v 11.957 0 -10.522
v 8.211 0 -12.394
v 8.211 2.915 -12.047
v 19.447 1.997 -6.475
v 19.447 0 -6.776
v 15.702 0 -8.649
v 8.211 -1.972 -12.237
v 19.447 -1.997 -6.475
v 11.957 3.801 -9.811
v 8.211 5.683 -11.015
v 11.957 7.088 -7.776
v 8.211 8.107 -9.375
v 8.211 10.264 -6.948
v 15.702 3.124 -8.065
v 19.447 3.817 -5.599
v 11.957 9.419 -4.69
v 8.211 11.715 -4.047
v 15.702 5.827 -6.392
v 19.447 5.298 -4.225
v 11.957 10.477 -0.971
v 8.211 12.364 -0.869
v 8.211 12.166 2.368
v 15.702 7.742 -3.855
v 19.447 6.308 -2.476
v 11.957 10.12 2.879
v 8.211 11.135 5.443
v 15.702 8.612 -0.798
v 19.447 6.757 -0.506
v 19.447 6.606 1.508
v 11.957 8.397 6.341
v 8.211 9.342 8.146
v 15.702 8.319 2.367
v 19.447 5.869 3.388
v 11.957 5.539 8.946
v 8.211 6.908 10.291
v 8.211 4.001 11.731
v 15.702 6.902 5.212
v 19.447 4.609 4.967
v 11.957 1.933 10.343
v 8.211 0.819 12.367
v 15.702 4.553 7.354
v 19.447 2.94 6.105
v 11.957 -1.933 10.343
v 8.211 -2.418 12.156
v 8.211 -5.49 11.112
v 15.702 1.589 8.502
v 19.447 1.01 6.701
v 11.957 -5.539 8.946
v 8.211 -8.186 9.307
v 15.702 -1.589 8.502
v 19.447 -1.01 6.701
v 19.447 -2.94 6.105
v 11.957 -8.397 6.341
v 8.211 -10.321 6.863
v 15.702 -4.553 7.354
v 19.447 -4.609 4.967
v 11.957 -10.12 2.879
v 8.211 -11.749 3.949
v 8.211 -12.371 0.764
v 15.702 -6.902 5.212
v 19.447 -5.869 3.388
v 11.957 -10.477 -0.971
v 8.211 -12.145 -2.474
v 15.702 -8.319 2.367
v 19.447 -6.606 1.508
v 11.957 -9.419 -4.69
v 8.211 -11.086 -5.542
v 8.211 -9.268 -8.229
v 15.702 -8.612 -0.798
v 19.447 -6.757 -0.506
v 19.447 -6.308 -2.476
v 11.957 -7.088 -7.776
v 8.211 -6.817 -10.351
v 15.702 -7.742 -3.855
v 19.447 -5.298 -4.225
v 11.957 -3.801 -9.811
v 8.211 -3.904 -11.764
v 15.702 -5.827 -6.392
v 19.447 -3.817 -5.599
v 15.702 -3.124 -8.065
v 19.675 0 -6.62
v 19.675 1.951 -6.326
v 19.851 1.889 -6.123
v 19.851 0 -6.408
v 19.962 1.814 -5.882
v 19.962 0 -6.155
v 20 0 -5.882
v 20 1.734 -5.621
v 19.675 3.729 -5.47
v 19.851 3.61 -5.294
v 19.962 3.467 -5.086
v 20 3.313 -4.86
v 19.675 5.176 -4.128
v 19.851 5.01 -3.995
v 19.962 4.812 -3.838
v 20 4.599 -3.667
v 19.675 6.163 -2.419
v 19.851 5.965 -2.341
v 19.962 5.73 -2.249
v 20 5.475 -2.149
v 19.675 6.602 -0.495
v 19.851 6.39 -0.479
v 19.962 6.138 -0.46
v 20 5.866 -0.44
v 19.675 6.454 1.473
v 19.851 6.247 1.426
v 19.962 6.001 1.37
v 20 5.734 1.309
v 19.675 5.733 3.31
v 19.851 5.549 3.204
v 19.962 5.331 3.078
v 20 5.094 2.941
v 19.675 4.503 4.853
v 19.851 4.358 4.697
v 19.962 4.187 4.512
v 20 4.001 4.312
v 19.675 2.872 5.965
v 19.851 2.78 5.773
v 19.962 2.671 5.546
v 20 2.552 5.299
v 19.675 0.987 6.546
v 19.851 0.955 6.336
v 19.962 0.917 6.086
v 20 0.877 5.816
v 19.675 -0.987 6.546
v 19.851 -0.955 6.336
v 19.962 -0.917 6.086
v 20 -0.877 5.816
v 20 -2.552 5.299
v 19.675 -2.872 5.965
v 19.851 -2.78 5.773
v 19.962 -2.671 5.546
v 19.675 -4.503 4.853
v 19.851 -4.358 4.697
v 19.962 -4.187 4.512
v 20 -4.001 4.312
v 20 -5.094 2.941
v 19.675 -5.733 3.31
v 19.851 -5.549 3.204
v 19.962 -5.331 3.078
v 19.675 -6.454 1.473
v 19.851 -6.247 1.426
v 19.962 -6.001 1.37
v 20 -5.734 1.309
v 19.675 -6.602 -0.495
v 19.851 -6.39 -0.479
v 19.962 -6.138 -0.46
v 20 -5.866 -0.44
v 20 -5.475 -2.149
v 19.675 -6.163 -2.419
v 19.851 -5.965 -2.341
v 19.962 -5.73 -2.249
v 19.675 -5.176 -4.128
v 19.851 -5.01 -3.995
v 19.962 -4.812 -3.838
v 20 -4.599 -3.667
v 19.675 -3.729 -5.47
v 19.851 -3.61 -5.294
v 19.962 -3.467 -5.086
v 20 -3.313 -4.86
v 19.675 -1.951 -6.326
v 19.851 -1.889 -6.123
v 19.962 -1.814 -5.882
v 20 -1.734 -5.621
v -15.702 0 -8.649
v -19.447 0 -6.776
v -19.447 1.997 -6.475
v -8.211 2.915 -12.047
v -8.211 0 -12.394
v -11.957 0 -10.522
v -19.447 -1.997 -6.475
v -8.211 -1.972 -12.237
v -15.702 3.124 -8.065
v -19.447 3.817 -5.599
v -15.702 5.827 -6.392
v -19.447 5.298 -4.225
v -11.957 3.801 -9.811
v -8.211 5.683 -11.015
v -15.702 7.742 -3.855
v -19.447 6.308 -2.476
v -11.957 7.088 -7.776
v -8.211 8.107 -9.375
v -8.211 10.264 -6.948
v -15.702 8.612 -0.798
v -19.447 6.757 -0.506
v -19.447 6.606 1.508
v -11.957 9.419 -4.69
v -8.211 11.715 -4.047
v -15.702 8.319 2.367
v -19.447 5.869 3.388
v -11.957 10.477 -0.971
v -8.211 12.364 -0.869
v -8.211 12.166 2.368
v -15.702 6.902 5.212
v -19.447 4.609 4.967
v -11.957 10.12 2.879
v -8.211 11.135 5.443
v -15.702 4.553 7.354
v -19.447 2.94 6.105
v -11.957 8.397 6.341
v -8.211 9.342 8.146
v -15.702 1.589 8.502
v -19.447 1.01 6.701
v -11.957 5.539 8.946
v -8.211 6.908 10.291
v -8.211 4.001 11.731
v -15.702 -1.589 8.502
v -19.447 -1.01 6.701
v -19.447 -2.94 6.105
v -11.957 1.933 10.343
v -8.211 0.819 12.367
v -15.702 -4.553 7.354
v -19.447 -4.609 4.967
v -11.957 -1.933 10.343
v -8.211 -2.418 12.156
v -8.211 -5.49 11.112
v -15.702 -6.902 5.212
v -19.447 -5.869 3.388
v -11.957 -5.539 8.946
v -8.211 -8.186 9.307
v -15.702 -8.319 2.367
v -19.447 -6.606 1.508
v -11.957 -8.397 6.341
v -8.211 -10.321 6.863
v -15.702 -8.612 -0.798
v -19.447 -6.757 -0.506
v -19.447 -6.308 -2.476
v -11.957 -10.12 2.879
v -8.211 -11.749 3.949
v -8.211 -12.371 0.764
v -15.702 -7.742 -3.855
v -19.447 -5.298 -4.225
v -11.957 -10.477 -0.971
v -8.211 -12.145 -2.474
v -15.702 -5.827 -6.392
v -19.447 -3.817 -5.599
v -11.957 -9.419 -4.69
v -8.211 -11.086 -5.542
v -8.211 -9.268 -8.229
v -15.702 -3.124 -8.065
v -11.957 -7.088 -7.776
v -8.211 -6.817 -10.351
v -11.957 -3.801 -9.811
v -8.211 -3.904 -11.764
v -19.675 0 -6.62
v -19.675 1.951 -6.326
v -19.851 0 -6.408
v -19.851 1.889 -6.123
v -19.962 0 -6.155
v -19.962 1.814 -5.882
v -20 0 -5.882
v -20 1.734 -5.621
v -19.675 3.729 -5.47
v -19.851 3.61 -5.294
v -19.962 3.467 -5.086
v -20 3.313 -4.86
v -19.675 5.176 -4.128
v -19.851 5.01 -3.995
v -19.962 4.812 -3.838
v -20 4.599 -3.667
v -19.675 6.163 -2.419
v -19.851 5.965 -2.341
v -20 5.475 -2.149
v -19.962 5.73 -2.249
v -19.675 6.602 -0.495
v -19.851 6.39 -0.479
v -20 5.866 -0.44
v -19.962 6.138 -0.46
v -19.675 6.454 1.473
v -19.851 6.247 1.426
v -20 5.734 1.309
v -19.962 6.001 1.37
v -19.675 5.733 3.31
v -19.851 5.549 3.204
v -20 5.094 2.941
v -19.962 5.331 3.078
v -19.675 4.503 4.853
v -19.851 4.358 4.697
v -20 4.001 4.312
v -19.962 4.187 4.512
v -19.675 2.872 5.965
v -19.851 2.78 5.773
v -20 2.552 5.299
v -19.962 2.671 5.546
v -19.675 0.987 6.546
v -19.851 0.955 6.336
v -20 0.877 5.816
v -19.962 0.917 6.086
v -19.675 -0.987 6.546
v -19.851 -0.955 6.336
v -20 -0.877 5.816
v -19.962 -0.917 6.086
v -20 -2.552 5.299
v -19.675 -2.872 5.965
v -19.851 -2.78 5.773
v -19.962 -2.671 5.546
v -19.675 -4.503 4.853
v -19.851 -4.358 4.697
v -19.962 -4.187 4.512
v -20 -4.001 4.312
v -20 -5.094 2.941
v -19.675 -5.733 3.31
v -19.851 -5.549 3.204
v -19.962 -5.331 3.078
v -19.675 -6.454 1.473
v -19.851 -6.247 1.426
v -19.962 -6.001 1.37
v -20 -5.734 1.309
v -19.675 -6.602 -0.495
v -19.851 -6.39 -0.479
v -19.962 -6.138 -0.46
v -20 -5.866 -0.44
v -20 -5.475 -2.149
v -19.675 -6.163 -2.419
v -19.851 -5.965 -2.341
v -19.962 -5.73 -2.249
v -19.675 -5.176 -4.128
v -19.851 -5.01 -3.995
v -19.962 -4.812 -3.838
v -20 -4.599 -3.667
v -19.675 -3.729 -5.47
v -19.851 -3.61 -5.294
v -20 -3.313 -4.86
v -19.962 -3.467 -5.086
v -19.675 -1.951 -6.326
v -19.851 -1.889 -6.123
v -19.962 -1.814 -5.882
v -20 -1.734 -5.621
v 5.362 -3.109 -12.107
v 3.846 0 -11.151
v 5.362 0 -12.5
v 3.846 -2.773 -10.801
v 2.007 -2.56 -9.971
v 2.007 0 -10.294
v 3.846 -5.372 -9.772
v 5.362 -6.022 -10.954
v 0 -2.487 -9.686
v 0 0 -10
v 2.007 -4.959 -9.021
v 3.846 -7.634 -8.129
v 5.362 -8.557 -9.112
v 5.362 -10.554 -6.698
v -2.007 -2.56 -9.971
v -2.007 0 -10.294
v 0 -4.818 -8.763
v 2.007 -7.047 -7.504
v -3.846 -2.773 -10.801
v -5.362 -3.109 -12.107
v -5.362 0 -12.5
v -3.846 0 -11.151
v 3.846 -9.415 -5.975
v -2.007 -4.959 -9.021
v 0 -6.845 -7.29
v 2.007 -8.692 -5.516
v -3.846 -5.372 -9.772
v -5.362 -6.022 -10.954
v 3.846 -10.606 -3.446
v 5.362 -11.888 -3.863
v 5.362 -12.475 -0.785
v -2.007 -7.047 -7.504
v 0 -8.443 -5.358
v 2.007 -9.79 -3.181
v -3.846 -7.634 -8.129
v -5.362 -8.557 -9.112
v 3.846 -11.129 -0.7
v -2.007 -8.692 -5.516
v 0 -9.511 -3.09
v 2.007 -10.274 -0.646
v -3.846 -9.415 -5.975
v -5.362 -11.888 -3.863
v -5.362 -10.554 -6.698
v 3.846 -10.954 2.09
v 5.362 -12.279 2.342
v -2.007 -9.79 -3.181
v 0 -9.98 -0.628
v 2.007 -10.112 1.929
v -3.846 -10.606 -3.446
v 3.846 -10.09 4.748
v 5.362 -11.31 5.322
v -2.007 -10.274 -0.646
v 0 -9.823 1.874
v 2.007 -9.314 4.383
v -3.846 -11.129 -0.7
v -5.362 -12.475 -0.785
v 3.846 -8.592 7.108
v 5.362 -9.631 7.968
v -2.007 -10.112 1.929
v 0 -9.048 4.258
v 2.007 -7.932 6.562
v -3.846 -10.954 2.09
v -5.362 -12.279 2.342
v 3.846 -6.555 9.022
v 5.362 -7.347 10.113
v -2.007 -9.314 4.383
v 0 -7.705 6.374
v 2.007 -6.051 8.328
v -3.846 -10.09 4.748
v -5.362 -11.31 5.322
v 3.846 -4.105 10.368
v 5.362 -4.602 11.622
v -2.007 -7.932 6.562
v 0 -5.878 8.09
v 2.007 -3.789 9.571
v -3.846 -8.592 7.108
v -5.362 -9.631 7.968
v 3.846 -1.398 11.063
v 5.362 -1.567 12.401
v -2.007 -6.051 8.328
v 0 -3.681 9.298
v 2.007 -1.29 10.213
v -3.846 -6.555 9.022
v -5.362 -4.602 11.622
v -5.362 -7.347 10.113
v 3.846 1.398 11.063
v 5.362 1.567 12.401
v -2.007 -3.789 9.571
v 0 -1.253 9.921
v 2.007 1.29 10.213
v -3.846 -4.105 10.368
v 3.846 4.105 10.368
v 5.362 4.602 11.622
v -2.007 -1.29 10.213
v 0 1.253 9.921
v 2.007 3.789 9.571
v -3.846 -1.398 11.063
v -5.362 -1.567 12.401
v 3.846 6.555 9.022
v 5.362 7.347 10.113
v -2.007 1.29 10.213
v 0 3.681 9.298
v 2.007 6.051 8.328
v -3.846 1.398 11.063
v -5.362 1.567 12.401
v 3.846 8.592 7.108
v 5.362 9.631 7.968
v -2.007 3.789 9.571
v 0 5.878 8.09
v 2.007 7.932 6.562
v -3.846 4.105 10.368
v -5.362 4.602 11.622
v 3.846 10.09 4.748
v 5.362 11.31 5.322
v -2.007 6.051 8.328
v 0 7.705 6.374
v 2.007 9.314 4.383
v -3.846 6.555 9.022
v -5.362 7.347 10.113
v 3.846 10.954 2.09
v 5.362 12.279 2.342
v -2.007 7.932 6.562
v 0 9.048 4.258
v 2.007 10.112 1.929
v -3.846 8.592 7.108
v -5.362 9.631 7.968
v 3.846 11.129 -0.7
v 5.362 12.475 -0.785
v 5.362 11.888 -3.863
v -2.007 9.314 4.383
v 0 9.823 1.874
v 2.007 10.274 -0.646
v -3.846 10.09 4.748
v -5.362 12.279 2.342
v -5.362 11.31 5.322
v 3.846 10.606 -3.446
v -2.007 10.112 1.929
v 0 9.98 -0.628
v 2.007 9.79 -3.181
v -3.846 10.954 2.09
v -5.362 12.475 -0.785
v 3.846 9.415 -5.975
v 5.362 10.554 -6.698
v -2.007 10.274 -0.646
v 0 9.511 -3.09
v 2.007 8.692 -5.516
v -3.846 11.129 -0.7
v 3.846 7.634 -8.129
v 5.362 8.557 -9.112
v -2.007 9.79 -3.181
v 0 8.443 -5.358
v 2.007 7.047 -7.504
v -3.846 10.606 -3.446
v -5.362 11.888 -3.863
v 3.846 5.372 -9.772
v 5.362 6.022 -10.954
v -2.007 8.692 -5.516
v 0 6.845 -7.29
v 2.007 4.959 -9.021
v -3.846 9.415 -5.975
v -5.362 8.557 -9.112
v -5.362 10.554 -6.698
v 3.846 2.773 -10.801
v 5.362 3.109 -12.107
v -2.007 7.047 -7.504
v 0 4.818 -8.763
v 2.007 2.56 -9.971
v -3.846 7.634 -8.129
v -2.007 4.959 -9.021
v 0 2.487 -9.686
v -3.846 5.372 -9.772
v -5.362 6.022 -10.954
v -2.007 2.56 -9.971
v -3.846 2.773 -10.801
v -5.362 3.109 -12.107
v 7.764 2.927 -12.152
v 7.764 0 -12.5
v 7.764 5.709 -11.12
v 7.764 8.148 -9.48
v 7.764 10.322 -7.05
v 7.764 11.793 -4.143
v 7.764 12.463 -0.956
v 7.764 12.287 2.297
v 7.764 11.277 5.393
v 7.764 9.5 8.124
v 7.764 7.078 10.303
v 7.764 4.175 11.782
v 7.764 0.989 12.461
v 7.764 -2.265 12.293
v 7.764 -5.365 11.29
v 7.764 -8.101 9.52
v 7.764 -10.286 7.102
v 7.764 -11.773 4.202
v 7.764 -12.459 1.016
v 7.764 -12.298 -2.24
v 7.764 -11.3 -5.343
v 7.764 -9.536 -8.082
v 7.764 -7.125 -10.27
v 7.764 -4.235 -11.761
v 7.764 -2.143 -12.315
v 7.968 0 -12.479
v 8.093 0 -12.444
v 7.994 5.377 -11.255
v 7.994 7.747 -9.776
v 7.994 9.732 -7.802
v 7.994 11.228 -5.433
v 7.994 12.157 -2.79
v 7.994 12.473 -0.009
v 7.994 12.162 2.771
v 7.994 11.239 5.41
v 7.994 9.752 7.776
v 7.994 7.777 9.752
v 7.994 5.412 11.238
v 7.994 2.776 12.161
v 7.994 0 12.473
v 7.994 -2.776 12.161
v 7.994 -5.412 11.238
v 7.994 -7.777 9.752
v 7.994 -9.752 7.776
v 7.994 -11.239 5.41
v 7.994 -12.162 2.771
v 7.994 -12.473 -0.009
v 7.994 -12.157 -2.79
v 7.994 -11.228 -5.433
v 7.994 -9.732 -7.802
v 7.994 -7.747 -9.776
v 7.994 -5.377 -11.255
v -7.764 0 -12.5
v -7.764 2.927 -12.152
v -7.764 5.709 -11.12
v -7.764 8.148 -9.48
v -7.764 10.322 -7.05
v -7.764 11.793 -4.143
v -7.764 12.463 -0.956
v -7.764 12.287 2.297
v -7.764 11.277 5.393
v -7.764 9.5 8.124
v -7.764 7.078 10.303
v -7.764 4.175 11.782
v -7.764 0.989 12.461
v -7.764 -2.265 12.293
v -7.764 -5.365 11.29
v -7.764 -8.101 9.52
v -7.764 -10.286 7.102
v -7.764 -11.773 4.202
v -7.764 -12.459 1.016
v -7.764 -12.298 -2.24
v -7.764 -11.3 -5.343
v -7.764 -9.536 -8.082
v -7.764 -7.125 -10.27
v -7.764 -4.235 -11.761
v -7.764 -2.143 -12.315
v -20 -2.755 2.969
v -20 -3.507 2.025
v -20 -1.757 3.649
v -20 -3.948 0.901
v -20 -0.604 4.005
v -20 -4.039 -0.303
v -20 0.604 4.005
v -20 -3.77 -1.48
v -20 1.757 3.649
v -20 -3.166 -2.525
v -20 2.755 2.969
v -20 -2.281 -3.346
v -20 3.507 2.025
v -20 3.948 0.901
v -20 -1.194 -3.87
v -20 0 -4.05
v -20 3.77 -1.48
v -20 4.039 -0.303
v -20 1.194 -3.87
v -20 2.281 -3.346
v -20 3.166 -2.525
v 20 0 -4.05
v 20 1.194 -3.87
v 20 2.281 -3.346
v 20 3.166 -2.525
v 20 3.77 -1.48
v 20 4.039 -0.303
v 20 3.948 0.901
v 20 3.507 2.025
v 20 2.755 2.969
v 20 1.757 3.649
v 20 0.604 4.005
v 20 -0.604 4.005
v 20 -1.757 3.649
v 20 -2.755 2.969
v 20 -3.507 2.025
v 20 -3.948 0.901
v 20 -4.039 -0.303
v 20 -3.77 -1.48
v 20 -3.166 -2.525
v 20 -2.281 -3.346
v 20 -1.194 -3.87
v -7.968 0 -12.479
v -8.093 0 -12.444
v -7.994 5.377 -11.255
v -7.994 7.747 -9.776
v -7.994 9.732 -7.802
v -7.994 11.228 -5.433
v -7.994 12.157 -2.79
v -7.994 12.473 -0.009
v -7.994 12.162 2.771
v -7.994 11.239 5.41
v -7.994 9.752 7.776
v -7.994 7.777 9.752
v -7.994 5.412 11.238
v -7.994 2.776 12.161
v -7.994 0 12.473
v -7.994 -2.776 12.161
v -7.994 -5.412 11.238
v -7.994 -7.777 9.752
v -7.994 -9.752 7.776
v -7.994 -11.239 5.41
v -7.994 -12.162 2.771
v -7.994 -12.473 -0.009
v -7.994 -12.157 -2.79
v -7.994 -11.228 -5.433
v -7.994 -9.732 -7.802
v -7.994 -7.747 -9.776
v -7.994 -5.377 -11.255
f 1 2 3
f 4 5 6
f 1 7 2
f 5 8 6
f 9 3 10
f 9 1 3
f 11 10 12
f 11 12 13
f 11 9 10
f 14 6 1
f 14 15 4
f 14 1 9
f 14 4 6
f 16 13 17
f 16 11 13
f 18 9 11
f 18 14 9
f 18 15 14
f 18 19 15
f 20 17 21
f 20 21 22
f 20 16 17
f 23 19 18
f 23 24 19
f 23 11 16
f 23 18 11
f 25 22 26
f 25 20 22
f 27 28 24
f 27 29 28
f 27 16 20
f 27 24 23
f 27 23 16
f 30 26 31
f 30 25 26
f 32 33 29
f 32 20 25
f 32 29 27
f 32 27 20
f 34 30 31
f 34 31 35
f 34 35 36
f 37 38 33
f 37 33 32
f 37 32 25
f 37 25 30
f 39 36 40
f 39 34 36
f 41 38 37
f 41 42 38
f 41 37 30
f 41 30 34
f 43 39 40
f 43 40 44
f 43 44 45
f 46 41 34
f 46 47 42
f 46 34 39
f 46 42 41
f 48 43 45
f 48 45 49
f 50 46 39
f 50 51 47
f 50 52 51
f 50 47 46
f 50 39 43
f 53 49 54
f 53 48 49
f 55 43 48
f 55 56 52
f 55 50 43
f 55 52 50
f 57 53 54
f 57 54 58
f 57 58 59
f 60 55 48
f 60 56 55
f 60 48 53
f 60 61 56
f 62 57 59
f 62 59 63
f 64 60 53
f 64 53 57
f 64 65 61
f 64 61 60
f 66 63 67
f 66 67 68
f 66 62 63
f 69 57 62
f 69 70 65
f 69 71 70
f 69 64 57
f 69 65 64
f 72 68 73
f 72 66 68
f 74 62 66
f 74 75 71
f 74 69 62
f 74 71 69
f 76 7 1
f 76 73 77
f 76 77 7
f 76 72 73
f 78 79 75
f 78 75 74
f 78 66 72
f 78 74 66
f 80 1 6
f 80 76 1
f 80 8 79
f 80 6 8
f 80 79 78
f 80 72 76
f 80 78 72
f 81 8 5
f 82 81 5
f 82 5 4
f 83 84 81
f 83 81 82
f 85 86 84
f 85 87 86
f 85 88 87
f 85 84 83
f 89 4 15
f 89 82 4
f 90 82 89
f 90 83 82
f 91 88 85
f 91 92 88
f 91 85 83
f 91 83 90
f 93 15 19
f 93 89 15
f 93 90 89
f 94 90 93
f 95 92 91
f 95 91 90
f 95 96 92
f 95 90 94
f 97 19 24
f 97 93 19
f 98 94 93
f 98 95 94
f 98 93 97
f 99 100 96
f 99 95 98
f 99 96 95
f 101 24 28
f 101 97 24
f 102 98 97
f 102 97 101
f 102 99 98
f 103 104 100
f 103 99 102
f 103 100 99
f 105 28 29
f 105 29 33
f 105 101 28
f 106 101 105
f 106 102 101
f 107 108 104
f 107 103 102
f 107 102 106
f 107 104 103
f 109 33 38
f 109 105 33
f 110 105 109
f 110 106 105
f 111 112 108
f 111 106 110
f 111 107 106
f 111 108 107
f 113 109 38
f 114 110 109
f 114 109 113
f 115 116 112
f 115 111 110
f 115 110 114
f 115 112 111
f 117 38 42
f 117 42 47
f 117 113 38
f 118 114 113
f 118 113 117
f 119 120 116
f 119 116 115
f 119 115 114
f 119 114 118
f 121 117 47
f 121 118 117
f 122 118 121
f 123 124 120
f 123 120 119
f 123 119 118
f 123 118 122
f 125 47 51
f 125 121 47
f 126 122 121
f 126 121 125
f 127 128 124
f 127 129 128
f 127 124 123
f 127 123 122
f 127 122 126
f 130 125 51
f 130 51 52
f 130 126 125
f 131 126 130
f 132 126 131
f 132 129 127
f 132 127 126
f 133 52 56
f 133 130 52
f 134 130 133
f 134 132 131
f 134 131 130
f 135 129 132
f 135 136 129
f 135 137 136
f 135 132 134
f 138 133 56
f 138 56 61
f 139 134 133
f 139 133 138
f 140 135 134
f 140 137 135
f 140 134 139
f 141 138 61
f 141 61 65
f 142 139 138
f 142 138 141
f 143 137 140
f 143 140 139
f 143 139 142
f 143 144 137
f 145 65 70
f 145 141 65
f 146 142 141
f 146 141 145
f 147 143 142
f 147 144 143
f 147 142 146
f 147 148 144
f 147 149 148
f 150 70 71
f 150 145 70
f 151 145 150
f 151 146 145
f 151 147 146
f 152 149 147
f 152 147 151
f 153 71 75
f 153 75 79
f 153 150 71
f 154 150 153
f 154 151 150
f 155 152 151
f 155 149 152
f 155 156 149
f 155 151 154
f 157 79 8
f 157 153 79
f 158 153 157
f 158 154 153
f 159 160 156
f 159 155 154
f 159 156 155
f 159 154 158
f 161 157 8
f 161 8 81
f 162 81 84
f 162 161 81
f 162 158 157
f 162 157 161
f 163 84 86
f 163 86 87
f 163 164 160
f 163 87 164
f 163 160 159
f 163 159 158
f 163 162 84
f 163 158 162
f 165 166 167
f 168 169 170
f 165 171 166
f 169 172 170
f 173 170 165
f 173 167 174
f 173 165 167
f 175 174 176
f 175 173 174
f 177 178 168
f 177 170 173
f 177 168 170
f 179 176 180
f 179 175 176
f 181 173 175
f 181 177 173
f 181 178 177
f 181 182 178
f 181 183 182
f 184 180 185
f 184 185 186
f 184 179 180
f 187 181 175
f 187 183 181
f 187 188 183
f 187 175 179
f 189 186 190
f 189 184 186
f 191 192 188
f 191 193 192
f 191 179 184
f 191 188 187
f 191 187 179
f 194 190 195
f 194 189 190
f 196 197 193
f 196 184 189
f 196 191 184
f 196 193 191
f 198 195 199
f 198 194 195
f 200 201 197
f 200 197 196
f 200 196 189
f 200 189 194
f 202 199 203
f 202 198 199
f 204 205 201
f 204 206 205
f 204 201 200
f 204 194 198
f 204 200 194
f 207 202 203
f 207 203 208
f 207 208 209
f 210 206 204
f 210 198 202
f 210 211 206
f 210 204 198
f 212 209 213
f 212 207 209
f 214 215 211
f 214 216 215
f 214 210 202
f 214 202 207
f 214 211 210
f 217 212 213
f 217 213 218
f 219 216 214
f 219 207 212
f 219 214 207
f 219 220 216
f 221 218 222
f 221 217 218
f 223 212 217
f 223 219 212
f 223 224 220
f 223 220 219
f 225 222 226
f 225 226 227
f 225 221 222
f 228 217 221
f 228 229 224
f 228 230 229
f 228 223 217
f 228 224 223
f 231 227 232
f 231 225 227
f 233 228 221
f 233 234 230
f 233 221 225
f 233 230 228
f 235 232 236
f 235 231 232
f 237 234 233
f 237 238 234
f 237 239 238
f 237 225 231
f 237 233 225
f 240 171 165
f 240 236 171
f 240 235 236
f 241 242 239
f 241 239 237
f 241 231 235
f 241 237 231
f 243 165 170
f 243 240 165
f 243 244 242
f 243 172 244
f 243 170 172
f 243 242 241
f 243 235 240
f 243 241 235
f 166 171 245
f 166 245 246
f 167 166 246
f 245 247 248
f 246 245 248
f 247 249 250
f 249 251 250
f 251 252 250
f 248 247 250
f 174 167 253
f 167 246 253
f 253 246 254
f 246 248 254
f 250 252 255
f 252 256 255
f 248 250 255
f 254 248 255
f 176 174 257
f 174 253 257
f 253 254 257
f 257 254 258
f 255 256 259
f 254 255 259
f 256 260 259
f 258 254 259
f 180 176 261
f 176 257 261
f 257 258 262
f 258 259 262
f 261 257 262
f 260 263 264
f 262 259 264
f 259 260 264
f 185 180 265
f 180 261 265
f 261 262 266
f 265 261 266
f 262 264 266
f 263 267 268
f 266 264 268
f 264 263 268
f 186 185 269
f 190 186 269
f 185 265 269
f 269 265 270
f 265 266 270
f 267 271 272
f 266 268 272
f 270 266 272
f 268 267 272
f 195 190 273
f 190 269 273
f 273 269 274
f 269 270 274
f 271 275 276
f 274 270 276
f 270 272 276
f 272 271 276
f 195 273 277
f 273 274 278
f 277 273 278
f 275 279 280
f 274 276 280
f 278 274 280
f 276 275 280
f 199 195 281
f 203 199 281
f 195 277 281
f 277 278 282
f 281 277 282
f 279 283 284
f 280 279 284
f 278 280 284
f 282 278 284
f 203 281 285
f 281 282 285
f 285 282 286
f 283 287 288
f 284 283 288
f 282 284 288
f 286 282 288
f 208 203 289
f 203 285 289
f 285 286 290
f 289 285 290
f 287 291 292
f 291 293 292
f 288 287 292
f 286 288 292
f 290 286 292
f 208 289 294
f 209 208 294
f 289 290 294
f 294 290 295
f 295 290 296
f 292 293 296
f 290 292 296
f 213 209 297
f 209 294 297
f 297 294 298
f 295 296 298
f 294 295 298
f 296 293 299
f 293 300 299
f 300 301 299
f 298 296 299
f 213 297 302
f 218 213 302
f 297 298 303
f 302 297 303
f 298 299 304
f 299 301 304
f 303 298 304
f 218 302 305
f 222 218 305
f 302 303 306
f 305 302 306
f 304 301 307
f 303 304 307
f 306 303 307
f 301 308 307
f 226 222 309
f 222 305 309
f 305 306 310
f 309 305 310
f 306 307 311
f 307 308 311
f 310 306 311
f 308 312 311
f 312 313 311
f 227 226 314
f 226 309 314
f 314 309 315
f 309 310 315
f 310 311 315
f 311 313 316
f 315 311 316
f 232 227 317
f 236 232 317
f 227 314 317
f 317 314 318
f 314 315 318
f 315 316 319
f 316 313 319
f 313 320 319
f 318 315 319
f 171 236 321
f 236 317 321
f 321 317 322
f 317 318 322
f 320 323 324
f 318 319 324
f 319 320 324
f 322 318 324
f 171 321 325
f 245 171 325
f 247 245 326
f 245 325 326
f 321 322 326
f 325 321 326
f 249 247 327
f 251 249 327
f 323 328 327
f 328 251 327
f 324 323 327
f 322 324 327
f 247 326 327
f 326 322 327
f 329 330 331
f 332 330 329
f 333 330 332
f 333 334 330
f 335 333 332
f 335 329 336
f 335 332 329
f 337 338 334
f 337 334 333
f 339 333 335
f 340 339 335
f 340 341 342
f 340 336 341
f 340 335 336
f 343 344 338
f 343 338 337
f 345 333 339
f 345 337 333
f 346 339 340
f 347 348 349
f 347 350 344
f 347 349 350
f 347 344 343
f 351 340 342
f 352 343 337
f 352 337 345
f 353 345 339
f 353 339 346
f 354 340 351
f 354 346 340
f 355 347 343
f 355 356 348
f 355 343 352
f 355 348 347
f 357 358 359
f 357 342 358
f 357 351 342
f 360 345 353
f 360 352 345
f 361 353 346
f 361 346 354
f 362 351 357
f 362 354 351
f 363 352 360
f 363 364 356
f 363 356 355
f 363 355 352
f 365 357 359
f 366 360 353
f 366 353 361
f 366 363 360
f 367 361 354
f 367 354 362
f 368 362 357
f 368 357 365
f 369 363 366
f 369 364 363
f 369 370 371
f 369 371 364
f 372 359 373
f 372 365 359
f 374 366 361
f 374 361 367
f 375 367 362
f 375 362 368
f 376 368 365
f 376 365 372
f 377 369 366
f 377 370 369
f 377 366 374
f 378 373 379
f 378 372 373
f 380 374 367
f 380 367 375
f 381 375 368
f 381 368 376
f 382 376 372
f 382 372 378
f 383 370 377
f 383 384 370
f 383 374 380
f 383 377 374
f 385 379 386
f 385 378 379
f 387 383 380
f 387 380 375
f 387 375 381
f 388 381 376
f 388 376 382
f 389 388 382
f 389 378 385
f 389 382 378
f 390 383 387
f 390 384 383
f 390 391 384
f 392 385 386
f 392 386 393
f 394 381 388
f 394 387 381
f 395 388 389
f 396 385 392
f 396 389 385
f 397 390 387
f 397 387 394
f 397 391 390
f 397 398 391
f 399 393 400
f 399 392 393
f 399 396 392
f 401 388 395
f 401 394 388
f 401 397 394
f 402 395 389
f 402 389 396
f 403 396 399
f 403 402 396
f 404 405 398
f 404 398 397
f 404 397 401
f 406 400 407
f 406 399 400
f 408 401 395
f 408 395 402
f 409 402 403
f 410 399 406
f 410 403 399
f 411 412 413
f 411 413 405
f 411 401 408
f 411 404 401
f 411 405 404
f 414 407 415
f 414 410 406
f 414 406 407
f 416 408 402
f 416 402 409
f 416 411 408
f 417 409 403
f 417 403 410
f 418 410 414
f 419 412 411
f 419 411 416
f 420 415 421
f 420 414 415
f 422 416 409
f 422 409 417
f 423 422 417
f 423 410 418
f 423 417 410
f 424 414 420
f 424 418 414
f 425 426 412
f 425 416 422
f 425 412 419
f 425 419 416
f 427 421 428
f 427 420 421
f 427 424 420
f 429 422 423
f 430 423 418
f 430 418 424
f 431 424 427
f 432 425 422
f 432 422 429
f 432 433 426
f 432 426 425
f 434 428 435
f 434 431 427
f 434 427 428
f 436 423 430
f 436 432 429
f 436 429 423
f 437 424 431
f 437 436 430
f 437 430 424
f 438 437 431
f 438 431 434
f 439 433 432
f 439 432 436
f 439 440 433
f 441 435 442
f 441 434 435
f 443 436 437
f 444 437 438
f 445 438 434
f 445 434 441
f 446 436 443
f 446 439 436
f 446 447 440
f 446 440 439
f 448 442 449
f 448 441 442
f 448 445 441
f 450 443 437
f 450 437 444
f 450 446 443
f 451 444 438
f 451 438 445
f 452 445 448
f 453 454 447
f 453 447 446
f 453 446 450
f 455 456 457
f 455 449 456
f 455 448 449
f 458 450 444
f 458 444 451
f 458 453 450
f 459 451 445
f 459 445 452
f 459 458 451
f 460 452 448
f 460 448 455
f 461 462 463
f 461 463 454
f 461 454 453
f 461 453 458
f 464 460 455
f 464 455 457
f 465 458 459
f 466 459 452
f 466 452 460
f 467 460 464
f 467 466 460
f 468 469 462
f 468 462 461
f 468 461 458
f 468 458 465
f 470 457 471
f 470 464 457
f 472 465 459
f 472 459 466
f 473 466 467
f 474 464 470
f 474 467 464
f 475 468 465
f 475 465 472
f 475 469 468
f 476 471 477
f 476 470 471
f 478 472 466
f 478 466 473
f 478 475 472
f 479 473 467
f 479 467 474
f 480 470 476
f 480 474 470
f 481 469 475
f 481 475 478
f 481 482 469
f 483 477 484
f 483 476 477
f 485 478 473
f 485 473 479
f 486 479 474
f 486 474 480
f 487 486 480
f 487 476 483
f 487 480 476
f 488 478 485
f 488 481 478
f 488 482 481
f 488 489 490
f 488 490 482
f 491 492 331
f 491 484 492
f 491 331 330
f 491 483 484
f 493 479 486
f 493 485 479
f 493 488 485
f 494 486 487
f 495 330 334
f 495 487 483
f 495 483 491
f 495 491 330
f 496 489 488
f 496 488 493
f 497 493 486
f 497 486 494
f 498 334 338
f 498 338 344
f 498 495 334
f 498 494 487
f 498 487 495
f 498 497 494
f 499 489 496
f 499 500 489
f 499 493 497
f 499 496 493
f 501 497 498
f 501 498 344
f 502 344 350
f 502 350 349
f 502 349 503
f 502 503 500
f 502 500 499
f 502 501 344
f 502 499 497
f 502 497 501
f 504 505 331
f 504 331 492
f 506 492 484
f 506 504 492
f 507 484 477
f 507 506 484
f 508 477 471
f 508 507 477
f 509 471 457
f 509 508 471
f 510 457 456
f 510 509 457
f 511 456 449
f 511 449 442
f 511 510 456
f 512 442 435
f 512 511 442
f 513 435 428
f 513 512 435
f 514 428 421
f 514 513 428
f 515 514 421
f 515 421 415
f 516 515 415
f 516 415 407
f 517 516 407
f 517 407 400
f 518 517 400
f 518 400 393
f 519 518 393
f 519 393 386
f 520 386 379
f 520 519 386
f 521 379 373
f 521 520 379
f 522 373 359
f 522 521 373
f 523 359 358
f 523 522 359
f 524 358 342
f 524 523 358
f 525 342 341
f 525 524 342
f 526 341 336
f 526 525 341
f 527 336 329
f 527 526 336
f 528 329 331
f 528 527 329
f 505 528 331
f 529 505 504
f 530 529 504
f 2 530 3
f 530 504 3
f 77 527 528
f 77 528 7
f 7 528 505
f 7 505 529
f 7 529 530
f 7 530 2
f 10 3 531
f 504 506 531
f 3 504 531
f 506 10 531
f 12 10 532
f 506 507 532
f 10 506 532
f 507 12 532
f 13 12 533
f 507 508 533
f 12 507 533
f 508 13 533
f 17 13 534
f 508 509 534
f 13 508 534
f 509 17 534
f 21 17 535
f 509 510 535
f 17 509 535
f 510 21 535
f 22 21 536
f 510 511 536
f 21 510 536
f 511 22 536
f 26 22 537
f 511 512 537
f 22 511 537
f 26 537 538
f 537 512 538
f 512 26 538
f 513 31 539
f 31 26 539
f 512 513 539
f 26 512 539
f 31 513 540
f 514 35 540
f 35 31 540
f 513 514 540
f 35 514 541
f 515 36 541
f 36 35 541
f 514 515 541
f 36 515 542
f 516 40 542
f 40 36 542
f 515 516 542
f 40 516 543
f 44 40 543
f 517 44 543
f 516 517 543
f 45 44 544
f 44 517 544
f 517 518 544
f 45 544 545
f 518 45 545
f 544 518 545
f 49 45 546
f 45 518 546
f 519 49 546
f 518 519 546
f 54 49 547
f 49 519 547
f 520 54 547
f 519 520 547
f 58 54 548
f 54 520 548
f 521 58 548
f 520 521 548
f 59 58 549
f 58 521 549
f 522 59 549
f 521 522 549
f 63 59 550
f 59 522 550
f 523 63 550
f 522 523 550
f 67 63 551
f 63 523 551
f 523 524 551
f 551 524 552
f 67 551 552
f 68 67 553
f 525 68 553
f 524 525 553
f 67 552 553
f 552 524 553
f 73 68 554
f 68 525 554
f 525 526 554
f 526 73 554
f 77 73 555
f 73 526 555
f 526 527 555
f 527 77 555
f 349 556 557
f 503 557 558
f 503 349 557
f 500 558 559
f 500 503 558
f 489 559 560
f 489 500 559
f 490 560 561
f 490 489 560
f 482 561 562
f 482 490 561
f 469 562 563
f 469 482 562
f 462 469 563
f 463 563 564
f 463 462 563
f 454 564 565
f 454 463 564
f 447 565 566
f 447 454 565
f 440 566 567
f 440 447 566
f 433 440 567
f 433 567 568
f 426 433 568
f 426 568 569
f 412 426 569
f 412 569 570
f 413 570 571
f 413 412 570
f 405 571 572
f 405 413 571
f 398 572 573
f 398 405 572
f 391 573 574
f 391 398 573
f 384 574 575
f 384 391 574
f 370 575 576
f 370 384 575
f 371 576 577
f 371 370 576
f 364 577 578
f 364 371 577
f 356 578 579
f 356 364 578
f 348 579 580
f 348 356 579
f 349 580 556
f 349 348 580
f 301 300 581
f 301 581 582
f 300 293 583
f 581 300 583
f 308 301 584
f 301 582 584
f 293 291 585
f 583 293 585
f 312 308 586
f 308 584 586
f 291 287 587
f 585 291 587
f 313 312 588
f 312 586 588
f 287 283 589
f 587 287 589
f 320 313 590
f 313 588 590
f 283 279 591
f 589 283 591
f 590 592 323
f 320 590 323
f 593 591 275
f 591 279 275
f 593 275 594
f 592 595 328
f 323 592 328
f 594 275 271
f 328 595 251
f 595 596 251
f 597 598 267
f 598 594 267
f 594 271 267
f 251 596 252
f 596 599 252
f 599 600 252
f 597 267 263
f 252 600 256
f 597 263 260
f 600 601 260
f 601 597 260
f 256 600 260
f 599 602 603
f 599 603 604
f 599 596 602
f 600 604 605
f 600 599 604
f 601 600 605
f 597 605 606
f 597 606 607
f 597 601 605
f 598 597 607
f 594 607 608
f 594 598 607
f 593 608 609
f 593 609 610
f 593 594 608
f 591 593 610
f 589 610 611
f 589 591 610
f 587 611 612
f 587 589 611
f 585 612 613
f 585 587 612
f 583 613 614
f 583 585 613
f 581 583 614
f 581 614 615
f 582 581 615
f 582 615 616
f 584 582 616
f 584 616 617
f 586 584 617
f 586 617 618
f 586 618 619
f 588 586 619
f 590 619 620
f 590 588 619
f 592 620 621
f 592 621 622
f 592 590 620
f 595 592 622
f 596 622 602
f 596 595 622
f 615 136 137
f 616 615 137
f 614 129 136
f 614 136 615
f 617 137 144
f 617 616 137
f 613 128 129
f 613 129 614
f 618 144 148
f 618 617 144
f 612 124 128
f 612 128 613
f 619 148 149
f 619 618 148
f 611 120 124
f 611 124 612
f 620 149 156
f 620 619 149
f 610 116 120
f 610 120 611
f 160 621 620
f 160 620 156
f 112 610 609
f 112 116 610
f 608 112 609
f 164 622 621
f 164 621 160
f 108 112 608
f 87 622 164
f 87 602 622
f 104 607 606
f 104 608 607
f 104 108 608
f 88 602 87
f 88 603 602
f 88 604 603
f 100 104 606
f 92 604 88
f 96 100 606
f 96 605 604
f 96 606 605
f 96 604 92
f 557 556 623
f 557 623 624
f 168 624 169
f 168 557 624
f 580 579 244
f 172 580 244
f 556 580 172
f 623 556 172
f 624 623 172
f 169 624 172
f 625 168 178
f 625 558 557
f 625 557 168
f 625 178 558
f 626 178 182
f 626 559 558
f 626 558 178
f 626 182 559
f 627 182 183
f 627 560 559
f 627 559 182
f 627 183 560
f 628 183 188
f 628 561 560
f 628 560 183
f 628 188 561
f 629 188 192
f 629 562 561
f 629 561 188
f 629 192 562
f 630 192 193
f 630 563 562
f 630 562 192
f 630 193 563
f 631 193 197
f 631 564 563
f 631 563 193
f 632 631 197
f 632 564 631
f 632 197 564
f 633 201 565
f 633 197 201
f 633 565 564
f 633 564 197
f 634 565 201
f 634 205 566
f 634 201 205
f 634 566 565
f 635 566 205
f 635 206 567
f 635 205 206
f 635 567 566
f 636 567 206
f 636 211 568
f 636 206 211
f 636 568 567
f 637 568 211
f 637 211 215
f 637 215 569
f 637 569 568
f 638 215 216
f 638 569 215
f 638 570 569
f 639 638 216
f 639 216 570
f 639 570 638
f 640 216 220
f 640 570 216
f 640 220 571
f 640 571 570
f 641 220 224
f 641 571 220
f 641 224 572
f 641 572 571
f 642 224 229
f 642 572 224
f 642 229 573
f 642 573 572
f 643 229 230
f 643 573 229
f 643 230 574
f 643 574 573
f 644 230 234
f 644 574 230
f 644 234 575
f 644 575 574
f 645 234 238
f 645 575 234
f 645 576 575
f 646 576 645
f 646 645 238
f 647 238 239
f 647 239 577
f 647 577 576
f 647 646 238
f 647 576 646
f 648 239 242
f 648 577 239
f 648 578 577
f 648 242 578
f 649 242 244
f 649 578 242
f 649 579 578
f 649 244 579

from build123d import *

# Parameters (mm, degrees)
CROQUIS1_R              = 12.5
CROQUIS1_R_2            = 4.05
SALIENTE_EXTRUIR1_DEPTH = 20
CROQUIS2_R              = 7
CHAFL_N1_SIZE           = 6
CHAFL_N1_SIZE2          = 12
CHAFL_N2_SIZE           = 12
CHAFL_N2_SIZE2          = 6
REDONDEO1_R             = 1


with BuildPart() as part:
    # Croquis1 → Saliente-Extruir1 (new, symmetric)
    with BuildSketch(Plane.YZ):
        with Locations(Location((0, 0, 0), (0, 0, 270))):
            Circle(CROQUIS1_R)
        with Locations(Location((0, 0, 0), (0, 0, 270))):
            Circle(CROQUIS1_R_2, mode=Mode.SUBTRACT)
    extrude(amount=SALIENTE_EXTRUIR1_DEPTH, both=True)

    # Croquis2 → Cortar-Revolución1 (revolve, cut)
    with BuildSketch(Plane(origin=(0, 0, 0), x_dir=(-1, 0, 0), z_dir=(0, 1, 0)), mode=Mode.PRIVATE) as cortar_revoluci_n1_sk:
        with Locations((0, 17)):
            Circle(CROQUIS2_R)
    revolve(cortar_revoluci_n1_sk.sketch.rotate(Axis((8.275317192, 0, 0), (-1, 0, 0)), 180), axis=Axis((8.275317192, 0, 0), (-1, 0, 0)), mode=Mode.SUBTRACT)

    # Chaflán1
    chafl_n1_edges = [part.edges().sort_by_distance(p)[0] for p in [
        (-20, 0, 12.5),
    ]]
    chafl_n1_side = [part.faces().sort_by_distance(p)[0] for p in [
        (-20, 0, 12.146446609),
    ]]
    chamfer(chafl_n1_edges, length=CHAFL_N1_SIZE, length2=CHAFL_N1_SIZE2, reference=chafl_n1_side[0])

    # Chaflán2
    chafl_n2_edges = [part.edges().sort_by_distance(p)[0] for p in [
        (20, 0, 12.5),
    ]]
    chafl_n2_side = [part.faces().sort_by_distance(p)[0] for p in [
        (12.680951324, 0, 12.5),
    ]]
    chamfer(chafl_n2_edges, length=CHAFL_N2_SIZE, length2=CHAFL_N2_SIZE2, reference=chafl_n2_side[0])

    # Redondeo1
    redondeo1_edges = [part.edges().sort_by_distance(p)[0] for p in [
        (-8, 0, 12.5),
        (-20, 0, 6.5),
        (20, 0, 6.5),
        (8, 0, 12.5),
    ]]
    fillet(redondeo1_edges, radius=REDONDEO1_R)


solid = part.part
